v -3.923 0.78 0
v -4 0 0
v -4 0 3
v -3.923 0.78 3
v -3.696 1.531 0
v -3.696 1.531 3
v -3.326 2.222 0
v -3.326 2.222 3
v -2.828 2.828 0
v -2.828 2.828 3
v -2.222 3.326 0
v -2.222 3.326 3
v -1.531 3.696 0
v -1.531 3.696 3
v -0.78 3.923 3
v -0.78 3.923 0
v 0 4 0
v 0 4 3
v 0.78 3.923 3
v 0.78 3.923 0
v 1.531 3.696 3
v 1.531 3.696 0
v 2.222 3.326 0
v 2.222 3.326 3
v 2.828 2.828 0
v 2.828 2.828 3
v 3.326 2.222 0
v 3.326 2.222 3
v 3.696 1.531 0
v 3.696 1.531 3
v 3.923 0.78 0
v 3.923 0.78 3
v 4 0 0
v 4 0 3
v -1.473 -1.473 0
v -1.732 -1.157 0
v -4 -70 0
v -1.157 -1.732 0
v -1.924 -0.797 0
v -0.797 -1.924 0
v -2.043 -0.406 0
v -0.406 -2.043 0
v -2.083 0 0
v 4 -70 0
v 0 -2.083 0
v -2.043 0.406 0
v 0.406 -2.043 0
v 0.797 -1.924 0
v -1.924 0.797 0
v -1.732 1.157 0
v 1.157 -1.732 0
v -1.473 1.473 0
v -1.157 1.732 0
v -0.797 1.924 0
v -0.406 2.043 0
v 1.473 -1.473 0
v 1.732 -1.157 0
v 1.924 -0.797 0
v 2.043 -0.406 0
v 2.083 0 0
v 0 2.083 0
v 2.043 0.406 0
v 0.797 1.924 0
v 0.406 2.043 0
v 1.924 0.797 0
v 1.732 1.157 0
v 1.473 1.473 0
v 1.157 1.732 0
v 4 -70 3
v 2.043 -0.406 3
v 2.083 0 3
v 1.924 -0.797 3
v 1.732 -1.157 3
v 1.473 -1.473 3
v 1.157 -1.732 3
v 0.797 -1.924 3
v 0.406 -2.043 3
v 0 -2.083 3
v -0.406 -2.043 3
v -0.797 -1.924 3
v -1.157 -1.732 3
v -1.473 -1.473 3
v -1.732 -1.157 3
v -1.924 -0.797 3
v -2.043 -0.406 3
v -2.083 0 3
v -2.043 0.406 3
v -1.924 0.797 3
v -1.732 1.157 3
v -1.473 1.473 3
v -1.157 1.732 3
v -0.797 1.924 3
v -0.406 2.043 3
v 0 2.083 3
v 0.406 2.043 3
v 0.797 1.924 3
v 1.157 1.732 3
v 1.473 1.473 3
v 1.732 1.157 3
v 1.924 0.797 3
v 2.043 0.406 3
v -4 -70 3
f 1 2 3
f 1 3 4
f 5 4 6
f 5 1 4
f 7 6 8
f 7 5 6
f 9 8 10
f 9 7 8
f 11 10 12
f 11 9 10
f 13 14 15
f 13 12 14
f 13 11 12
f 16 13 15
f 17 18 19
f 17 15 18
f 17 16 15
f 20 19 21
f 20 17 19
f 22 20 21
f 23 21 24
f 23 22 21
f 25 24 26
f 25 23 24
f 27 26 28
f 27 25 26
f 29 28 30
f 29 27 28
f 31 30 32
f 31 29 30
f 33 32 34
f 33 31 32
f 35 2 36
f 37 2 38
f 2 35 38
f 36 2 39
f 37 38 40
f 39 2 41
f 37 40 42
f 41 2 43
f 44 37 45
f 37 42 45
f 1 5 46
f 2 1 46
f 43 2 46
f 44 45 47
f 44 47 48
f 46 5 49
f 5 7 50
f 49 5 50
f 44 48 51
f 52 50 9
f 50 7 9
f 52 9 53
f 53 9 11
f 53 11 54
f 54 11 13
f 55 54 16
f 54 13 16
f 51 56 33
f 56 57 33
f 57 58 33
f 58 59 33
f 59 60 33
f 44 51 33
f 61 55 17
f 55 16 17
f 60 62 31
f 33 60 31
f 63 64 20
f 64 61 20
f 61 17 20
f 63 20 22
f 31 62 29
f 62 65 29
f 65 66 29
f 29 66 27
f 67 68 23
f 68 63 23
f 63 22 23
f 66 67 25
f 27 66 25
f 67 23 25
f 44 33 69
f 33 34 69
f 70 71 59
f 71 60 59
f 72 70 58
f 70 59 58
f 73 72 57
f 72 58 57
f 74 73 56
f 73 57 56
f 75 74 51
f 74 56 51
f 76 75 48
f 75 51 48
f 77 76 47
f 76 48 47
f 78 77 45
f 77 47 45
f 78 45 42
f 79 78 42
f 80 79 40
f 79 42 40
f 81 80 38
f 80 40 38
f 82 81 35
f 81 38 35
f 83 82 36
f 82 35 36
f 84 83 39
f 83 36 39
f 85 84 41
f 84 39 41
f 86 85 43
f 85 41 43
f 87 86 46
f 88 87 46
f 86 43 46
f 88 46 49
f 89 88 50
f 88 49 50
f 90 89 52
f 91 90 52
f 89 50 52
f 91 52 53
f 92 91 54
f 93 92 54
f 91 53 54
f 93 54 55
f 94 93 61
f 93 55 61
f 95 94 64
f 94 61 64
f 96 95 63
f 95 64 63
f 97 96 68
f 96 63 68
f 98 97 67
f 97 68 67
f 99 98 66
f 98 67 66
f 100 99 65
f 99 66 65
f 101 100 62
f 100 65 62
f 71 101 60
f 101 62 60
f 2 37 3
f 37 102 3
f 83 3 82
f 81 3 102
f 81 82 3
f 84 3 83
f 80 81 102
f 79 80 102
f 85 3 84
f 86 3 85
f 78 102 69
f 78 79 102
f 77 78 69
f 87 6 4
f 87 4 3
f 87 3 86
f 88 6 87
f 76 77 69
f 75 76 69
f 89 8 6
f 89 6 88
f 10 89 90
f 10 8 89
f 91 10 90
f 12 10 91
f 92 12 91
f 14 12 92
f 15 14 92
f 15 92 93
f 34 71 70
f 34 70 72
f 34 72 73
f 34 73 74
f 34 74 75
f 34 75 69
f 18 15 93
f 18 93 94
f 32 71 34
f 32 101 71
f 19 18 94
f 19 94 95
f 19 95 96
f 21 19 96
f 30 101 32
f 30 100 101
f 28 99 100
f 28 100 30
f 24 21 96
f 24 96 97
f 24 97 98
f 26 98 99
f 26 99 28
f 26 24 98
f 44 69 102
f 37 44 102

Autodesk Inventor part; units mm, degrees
ref_plane "YZ Plane" through (0, 0, 0) normal (1, 0, 0) x (0, 1, 0)
ref_plane "XZ Plane" through (0, 0, 0) normal (0, 1, 0) x (-1, 0, 0)
ref_plane "XY Plane" through (0, 0, 0) normal (0, 0, 1) x (1, 0, 0)
sketch "Sketch1" plane through (0, 0, 0) normal (0, 0, 1) x (1, 0, 0)
  circle A0 centre (0, 0) radius 2.0828
  dimension "d0" = 4.1656
sketch "Sketch2" plane through (0, 0, 0) normal (0, 0, 1) x (1, 0, 0)
  circle A0 centre (0, 0) radius 4
  dimension "d1" = 8
extrude "Extrusion1" add sketch "Sketch2" along normal blind 3
sketch "Sketch3" plane through (0, 0, 3) normal (0, 0, 1) x (1, 0, 0)
  circle A0 centre (0, 0) radius 4 projected
  line L0 (-4, 0) -> (4, 0)
  line L1 (4, 0) -> (4, -70)
  line L2 (4, -70) -> (-4, -70)
  line L3 (-4, -70) -> (-4, 0)
  dimension "d4" = 70
extrude "Extrusion2" add sketch "Sketch3" against normal blind 3 contours L1 L2 L3 A0
extrude "Extrusion3" cut sketch "Sketch1" along normal blind 5
properties part number "Finger"
